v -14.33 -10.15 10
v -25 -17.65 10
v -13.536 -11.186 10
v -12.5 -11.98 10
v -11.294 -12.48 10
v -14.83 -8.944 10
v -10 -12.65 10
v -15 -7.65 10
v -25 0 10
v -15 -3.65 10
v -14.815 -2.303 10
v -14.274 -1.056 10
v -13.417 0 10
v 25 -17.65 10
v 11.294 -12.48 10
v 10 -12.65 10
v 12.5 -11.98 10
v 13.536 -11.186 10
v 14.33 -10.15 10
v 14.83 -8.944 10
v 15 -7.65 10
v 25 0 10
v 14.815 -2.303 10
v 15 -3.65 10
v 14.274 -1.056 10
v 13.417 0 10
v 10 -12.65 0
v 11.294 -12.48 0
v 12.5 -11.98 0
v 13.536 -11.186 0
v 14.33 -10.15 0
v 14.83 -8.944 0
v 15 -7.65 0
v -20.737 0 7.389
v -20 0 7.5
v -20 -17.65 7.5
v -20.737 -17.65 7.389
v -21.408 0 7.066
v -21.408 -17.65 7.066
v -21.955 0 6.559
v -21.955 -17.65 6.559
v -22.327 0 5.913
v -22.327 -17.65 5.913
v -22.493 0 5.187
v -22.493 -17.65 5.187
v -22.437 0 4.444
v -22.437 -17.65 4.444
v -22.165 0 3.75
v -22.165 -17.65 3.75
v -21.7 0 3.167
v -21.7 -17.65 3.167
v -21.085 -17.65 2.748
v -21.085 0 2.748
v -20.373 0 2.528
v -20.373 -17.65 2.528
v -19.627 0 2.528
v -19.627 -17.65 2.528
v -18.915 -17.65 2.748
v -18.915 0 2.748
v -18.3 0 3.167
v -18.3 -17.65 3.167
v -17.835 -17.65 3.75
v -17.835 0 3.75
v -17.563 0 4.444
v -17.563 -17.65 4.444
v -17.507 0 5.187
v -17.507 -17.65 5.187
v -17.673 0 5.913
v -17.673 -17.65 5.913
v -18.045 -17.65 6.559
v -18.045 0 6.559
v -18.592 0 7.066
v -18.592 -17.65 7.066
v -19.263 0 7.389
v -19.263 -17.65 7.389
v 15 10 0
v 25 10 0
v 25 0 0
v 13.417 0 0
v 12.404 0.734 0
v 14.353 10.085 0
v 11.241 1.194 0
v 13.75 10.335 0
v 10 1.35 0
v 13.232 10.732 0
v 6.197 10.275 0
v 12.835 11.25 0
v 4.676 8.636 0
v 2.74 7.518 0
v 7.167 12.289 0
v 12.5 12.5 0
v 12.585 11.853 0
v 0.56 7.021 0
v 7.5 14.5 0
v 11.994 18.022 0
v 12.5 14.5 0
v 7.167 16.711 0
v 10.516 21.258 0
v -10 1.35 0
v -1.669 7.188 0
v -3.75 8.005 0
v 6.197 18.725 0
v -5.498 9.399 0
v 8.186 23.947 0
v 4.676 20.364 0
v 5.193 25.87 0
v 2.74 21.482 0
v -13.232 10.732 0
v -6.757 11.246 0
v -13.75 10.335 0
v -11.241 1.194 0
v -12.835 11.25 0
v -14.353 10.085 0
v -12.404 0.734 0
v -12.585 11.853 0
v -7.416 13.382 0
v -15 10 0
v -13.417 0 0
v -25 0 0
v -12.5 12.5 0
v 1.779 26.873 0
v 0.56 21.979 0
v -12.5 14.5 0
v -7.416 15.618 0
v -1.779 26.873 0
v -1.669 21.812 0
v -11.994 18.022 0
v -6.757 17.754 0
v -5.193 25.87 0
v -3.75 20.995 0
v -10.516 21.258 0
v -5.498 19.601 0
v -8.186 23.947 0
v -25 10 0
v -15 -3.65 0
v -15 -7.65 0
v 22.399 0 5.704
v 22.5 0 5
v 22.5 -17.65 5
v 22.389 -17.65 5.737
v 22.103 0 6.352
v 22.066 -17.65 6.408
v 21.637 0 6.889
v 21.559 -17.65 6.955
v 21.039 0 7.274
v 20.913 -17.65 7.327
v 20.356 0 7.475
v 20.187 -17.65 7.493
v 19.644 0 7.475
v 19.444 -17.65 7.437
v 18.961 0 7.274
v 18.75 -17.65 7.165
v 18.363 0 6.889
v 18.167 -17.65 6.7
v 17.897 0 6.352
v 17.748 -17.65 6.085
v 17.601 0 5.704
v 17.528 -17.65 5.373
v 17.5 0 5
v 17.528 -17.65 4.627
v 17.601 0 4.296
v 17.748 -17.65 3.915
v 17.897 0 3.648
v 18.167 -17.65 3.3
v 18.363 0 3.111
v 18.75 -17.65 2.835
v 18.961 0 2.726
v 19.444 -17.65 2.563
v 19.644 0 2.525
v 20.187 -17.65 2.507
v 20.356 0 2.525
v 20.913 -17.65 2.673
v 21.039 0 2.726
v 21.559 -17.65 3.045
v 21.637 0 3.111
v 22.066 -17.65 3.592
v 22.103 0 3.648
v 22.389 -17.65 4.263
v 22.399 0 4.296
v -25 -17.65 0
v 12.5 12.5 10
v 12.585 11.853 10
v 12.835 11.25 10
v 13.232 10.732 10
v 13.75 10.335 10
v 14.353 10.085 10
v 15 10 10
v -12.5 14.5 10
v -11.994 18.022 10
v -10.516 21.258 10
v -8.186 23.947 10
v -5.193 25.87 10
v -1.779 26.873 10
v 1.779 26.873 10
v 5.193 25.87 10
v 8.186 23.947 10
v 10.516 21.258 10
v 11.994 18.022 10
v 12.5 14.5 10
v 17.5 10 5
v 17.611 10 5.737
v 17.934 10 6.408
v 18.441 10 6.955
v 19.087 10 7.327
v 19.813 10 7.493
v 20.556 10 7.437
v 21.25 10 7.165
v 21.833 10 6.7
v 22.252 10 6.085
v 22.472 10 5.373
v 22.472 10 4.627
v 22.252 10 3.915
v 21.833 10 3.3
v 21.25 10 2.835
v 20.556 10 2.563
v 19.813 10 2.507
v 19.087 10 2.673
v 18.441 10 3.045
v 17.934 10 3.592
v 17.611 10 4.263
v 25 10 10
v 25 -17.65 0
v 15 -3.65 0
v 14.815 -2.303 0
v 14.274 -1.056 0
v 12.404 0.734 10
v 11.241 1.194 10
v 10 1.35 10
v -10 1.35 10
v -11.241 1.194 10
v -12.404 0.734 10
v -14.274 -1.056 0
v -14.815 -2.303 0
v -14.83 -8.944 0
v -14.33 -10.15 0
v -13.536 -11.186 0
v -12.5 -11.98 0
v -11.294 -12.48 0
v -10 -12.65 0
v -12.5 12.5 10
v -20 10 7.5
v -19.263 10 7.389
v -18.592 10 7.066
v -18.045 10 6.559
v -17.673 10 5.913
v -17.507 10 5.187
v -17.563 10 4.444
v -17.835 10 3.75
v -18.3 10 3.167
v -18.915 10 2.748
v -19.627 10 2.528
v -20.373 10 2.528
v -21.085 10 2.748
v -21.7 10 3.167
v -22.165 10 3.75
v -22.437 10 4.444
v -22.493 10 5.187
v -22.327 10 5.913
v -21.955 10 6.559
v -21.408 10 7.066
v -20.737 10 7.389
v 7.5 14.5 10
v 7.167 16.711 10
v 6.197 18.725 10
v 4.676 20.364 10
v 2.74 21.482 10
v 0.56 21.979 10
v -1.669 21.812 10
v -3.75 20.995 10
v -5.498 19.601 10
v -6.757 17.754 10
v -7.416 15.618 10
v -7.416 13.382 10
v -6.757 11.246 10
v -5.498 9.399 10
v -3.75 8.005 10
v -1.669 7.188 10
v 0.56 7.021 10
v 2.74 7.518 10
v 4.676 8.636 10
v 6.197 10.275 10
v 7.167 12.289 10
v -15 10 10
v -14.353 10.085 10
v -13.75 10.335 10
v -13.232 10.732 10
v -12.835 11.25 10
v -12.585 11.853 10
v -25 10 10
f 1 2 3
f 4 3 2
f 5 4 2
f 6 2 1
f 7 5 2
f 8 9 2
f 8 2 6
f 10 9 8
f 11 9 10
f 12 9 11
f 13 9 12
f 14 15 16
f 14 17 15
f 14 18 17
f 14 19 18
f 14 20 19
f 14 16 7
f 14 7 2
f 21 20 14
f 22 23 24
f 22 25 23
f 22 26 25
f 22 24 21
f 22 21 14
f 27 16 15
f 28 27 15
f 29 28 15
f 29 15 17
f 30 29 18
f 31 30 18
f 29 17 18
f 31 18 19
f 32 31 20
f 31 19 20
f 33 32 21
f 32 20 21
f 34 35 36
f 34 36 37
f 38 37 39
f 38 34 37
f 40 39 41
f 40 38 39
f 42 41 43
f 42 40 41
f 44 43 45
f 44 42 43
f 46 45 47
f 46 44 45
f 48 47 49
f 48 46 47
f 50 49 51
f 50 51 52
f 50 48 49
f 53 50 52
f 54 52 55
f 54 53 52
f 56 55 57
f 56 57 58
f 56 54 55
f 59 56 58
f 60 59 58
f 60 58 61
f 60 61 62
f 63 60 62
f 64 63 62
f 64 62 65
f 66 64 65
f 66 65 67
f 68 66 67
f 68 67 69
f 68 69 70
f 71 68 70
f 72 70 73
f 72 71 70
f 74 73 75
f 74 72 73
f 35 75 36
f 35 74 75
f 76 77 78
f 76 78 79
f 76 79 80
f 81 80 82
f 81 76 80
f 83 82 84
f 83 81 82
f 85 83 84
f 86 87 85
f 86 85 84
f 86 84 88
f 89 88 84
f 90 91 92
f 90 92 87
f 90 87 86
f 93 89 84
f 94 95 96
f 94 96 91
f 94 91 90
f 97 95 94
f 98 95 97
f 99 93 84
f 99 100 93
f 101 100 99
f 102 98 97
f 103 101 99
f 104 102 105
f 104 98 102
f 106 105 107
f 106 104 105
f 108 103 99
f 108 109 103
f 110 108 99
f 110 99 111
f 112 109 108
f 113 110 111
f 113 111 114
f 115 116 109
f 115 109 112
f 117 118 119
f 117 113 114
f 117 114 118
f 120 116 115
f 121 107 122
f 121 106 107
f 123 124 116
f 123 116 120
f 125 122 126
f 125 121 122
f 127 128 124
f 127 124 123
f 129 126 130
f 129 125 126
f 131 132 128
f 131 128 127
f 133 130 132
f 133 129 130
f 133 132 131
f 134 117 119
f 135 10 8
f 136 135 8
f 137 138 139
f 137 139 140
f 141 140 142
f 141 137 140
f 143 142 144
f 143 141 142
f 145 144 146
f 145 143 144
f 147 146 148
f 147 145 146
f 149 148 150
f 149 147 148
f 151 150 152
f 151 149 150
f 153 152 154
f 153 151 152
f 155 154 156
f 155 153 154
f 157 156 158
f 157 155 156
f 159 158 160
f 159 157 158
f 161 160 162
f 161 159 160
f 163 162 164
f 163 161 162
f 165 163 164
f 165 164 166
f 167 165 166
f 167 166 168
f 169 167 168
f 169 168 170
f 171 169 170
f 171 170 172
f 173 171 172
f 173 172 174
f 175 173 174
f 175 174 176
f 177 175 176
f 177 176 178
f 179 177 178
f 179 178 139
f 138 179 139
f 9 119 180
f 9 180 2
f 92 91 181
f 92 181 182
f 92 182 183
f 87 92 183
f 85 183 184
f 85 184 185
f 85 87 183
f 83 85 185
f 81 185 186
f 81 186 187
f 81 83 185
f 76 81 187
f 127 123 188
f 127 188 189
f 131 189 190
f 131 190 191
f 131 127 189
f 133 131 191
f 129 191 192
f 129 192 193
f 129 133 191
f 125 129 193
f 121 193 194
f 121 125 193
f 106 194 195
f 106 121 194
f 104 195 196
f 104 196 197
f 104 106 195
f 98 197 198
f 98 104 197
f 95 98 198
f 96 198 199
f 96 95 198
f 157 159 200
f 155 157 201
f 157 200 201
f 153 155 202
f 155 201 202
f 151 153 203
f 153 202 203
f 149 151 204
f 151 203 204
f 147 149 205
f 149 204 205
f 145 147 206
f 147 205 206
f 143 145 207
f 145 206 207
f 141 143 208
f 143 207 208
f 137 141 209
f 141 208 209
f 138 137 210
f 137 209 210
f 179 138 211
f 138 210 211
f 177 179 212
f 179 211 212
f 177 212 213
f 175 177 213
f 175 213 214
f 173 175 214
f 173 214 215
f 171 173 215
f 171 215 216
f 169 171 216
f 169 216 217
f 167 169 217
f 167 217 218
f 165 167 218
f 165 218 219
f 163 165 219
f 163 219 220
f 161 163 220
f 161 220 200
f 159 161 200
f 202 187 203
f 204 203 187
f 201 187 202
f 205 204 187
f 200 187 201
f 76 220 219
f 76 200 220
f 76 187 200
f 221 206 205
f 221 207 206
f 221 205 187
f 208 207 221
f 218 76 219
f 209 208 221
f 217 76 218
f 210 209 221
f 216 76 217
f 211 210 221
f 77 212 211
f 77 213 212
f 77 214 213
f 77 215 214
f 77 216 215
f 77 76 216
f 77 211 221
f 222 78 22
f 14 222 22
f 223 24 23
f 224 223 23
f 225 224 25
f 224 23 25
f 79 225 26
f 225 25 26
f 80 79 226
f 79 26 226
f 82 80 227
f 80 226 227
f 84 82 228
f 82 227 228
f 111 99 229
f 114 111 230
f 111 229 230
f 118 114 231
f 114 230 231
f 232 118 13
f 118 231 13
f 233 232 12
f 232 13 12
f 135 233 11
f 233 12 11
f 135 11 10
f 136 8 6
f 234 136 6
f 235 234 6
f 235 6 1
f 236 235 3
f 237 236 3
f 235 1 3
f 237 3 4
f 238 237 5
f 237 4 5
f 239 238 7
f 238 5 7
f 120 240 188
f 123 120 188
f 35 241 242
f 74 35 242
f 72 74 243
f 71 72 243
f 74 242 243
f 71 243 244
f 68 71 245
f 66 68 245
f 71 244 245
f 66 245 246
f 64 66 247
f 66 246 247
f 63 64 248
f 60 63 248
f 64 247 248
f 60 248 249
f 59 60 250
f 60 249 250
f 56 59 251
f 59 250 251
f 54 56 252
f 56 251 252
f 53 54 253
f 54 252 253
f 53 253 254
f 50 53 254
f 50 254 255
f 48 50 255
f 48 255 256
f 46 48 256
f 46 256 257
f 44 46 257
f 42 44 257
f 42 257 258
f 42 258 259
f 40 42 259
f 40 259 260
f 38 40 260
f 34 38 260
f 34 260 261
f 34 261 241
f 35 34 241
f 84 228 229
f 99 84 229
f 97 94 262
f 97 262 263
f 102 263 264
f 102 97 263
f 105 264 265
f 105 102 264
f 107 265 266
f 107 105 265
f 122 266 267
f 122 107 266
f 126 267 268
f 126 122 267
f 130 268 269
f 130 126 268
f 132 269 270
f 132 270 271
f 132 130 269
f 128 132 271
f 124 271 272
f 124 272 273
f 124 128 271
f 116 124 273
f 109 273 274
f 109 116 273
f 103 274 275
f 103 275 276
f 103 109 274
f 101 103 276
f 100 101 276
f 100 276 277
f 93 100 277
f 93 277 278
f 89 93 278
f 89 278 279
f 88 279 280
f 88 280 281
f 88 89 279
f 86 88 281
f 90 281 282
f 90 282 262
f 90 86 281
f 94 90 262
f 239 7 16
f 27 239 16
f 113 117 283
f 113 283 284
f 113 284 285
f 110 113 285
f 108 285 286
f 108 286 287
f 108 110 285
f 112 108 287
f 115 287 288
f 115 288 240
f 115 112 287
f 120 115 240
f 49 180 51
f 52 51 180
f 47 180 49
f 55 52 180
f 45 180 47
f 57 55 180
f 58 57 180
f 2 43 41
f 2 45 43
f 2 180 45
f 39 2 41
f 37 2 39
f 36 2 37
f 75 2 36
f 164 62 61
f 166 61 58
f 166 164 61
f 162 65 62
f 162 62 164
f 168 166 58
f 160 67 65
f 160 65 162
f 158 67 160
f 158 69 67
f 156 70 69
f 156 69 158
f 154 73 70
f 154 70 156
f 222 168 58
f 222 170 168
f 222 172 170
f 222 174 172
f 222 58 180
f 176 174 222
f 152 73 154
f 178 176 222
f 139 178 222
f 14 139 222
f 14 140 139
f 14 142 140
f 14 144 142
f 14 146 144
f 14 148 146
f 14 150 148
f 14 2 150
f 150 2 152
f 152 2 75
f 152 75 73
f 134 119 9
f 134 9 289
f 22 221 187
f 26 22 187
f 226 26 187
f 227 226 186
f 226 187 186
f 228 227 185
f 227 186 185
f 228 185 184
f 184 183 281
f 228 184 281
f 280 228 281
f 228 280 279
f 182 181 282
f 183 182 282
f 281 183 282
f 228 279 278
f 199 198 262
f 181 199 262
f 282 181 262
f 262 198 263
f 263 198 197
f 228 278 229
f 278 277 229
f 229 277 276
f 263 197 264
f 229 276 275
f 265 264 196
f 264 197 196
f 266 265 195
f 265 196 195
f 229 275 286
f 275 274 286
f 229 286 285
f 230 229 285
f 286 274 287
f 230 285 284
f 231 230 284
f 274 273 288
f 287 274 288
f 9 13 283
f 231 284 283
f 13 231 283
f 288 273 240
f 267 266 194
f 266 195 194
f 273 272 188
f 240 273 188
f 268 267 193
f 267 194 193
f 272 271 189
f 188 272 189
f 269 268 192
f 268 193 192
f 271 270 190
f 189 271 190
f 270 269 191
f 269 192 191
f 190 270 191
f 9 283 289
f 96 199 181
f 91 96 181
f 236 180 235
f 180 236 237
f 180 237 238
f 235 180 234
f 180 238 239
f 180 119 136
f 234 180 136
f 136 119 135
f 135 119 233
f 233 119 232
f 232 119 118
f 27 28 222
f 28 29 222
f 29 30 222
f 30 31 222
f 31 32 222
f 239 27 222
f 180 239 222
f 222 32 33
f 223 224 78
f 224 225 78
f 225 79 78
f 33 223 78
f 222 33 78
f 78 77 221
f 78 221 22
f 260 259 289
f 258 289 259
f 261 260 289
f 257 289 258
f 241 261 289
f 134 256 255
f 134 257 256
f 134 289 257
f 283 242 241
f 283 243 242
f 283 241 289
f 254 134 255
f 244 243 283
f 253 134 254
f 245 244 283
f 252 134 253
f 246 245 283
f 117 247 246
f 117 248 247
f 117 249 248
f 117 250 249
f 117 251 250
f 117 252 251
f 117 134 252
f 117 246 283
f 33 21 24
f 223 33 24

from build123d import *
from build123d.topology import SkipClean

# Parameters (mm, degrees)
SKETCH1_R           = 7.5
BOSS_EXTRUDE1_DEPTH = 10
SKETCH4_R           = 2.5
CUT_EXTRUDE1_DEPTH  = 20
SKETCH5_W           = 50
SKETCH5_H           = 10
SKETCH5_R           = 2.5
BOSS_EXTRUDE2_DEPTH = 17.65
CUT_EXTRUDE3_DEPTH  = 17.65


with BuildPart() as part:
    # Sketch1 → Boss-Extrude1 (new body)
    with BuildSketch(Plane.XY):
        with BuildLine():
            Line((0, 0), (-25, 0))
            Line((-25, 0), (-25, 10))
            Line((-25, 10), (-15, 10))
            ThreePointArc((-15, 10), (-13.232233047, 10.732233047), (-12.5, 12.5))
            Line((-12.5, 12.5), (-12.5, 14.5))
            ThreePointArc((-12.5, 14.5), (0, 27), (12.5, 14.5))
            Line((12.5, 14.5), (12.5, 12.5))
            ThreePointArc((12.5, 12.5), (13.232233047, 10.732233047), (15, 10))
            Line((15, 10), (25, 10))
            Line((25, 10), (25, 0))
            Line((25, 0), (0, 0))
        make_face()
        with Locations((0, 14.5)):
            Circle(SKETCH1_R, mode=Mode.SUBTRACT)
    extrude(amount=BOSS_EXTRUDE1_DEPTH)

    # Sketch4 → Cut-Extrude1 (cut)
    with BuildSketch(Plane(origin=(0, 10, 0), x_dir=(1, 0, 0), z_dir=(0, 1, 0))):
        with Locations(Location((-20, -5, 0), (0, 0, 270))):
            Circle(SKETCH4_R)
        with Locations(Location((20, -5, 0), (0, 0, 180))):
            Circle(SKETCH4_R)
    extrude(amount=-CUT_EXTRUDE1_DEPTH, mode=Mode.SUBTRACT)

    # Sketch5 → Boss-Extrude2 (add)
    with SkipClean():  # the faces are left unmerged after this step: merging them gives an invalid solid
        with BuildSketch(Plane.XZ):
            with Locations((0, 5)):
                Rectangle(SKETCH5_W, SKETCH5_H)
            with Locations(Location((-20, 5, 0), (0, 0, 90))):
                Circle(SKETCH5_R, mode=Mode.SUBTRACT)
            with Locations((20, 5)):
                Circle(SKETCH5_R, mode=Mode.SUBTRACT)
        extrude(amount=BOSS_EXTRUDE2_DEPTH)

    # Sketch6 → Cut-Extrude3 (cut)
    with SkipClean():  # the faces are left unmerged after this step: merging them gives an invalid solid
        with BuildSketch(Plane.XY.offset(10)):
            with BuildLine():
                Line((10, 1.35), (-10, 1.35))
                ThreePointArc((-10, 1.35), (-13.535533906, -0.114466094), (-15, -3.65))
                Line((-15, -3.65), (-15, -7.65))
                ThreePointArc((-15, -7.65), (-13.535533906, -11.185533906), (-10, -12.65))
                Line((-10, -12.65), (10, -12.65))
                ThreePointArc((10, -12.65), (13.535533906, -11.185533906), (15, -7.65))
                Line((15, -7.65), (15, -3.65))
                ThreePointArc((15, -3.65), (13.535533906, -0.114466094), (10, 1.35))
            make_face()
        extrude(amount=-CUT_EXTRUDE3_DEPTH, mode=Mode.SUBTRACT)


solid = part.part
